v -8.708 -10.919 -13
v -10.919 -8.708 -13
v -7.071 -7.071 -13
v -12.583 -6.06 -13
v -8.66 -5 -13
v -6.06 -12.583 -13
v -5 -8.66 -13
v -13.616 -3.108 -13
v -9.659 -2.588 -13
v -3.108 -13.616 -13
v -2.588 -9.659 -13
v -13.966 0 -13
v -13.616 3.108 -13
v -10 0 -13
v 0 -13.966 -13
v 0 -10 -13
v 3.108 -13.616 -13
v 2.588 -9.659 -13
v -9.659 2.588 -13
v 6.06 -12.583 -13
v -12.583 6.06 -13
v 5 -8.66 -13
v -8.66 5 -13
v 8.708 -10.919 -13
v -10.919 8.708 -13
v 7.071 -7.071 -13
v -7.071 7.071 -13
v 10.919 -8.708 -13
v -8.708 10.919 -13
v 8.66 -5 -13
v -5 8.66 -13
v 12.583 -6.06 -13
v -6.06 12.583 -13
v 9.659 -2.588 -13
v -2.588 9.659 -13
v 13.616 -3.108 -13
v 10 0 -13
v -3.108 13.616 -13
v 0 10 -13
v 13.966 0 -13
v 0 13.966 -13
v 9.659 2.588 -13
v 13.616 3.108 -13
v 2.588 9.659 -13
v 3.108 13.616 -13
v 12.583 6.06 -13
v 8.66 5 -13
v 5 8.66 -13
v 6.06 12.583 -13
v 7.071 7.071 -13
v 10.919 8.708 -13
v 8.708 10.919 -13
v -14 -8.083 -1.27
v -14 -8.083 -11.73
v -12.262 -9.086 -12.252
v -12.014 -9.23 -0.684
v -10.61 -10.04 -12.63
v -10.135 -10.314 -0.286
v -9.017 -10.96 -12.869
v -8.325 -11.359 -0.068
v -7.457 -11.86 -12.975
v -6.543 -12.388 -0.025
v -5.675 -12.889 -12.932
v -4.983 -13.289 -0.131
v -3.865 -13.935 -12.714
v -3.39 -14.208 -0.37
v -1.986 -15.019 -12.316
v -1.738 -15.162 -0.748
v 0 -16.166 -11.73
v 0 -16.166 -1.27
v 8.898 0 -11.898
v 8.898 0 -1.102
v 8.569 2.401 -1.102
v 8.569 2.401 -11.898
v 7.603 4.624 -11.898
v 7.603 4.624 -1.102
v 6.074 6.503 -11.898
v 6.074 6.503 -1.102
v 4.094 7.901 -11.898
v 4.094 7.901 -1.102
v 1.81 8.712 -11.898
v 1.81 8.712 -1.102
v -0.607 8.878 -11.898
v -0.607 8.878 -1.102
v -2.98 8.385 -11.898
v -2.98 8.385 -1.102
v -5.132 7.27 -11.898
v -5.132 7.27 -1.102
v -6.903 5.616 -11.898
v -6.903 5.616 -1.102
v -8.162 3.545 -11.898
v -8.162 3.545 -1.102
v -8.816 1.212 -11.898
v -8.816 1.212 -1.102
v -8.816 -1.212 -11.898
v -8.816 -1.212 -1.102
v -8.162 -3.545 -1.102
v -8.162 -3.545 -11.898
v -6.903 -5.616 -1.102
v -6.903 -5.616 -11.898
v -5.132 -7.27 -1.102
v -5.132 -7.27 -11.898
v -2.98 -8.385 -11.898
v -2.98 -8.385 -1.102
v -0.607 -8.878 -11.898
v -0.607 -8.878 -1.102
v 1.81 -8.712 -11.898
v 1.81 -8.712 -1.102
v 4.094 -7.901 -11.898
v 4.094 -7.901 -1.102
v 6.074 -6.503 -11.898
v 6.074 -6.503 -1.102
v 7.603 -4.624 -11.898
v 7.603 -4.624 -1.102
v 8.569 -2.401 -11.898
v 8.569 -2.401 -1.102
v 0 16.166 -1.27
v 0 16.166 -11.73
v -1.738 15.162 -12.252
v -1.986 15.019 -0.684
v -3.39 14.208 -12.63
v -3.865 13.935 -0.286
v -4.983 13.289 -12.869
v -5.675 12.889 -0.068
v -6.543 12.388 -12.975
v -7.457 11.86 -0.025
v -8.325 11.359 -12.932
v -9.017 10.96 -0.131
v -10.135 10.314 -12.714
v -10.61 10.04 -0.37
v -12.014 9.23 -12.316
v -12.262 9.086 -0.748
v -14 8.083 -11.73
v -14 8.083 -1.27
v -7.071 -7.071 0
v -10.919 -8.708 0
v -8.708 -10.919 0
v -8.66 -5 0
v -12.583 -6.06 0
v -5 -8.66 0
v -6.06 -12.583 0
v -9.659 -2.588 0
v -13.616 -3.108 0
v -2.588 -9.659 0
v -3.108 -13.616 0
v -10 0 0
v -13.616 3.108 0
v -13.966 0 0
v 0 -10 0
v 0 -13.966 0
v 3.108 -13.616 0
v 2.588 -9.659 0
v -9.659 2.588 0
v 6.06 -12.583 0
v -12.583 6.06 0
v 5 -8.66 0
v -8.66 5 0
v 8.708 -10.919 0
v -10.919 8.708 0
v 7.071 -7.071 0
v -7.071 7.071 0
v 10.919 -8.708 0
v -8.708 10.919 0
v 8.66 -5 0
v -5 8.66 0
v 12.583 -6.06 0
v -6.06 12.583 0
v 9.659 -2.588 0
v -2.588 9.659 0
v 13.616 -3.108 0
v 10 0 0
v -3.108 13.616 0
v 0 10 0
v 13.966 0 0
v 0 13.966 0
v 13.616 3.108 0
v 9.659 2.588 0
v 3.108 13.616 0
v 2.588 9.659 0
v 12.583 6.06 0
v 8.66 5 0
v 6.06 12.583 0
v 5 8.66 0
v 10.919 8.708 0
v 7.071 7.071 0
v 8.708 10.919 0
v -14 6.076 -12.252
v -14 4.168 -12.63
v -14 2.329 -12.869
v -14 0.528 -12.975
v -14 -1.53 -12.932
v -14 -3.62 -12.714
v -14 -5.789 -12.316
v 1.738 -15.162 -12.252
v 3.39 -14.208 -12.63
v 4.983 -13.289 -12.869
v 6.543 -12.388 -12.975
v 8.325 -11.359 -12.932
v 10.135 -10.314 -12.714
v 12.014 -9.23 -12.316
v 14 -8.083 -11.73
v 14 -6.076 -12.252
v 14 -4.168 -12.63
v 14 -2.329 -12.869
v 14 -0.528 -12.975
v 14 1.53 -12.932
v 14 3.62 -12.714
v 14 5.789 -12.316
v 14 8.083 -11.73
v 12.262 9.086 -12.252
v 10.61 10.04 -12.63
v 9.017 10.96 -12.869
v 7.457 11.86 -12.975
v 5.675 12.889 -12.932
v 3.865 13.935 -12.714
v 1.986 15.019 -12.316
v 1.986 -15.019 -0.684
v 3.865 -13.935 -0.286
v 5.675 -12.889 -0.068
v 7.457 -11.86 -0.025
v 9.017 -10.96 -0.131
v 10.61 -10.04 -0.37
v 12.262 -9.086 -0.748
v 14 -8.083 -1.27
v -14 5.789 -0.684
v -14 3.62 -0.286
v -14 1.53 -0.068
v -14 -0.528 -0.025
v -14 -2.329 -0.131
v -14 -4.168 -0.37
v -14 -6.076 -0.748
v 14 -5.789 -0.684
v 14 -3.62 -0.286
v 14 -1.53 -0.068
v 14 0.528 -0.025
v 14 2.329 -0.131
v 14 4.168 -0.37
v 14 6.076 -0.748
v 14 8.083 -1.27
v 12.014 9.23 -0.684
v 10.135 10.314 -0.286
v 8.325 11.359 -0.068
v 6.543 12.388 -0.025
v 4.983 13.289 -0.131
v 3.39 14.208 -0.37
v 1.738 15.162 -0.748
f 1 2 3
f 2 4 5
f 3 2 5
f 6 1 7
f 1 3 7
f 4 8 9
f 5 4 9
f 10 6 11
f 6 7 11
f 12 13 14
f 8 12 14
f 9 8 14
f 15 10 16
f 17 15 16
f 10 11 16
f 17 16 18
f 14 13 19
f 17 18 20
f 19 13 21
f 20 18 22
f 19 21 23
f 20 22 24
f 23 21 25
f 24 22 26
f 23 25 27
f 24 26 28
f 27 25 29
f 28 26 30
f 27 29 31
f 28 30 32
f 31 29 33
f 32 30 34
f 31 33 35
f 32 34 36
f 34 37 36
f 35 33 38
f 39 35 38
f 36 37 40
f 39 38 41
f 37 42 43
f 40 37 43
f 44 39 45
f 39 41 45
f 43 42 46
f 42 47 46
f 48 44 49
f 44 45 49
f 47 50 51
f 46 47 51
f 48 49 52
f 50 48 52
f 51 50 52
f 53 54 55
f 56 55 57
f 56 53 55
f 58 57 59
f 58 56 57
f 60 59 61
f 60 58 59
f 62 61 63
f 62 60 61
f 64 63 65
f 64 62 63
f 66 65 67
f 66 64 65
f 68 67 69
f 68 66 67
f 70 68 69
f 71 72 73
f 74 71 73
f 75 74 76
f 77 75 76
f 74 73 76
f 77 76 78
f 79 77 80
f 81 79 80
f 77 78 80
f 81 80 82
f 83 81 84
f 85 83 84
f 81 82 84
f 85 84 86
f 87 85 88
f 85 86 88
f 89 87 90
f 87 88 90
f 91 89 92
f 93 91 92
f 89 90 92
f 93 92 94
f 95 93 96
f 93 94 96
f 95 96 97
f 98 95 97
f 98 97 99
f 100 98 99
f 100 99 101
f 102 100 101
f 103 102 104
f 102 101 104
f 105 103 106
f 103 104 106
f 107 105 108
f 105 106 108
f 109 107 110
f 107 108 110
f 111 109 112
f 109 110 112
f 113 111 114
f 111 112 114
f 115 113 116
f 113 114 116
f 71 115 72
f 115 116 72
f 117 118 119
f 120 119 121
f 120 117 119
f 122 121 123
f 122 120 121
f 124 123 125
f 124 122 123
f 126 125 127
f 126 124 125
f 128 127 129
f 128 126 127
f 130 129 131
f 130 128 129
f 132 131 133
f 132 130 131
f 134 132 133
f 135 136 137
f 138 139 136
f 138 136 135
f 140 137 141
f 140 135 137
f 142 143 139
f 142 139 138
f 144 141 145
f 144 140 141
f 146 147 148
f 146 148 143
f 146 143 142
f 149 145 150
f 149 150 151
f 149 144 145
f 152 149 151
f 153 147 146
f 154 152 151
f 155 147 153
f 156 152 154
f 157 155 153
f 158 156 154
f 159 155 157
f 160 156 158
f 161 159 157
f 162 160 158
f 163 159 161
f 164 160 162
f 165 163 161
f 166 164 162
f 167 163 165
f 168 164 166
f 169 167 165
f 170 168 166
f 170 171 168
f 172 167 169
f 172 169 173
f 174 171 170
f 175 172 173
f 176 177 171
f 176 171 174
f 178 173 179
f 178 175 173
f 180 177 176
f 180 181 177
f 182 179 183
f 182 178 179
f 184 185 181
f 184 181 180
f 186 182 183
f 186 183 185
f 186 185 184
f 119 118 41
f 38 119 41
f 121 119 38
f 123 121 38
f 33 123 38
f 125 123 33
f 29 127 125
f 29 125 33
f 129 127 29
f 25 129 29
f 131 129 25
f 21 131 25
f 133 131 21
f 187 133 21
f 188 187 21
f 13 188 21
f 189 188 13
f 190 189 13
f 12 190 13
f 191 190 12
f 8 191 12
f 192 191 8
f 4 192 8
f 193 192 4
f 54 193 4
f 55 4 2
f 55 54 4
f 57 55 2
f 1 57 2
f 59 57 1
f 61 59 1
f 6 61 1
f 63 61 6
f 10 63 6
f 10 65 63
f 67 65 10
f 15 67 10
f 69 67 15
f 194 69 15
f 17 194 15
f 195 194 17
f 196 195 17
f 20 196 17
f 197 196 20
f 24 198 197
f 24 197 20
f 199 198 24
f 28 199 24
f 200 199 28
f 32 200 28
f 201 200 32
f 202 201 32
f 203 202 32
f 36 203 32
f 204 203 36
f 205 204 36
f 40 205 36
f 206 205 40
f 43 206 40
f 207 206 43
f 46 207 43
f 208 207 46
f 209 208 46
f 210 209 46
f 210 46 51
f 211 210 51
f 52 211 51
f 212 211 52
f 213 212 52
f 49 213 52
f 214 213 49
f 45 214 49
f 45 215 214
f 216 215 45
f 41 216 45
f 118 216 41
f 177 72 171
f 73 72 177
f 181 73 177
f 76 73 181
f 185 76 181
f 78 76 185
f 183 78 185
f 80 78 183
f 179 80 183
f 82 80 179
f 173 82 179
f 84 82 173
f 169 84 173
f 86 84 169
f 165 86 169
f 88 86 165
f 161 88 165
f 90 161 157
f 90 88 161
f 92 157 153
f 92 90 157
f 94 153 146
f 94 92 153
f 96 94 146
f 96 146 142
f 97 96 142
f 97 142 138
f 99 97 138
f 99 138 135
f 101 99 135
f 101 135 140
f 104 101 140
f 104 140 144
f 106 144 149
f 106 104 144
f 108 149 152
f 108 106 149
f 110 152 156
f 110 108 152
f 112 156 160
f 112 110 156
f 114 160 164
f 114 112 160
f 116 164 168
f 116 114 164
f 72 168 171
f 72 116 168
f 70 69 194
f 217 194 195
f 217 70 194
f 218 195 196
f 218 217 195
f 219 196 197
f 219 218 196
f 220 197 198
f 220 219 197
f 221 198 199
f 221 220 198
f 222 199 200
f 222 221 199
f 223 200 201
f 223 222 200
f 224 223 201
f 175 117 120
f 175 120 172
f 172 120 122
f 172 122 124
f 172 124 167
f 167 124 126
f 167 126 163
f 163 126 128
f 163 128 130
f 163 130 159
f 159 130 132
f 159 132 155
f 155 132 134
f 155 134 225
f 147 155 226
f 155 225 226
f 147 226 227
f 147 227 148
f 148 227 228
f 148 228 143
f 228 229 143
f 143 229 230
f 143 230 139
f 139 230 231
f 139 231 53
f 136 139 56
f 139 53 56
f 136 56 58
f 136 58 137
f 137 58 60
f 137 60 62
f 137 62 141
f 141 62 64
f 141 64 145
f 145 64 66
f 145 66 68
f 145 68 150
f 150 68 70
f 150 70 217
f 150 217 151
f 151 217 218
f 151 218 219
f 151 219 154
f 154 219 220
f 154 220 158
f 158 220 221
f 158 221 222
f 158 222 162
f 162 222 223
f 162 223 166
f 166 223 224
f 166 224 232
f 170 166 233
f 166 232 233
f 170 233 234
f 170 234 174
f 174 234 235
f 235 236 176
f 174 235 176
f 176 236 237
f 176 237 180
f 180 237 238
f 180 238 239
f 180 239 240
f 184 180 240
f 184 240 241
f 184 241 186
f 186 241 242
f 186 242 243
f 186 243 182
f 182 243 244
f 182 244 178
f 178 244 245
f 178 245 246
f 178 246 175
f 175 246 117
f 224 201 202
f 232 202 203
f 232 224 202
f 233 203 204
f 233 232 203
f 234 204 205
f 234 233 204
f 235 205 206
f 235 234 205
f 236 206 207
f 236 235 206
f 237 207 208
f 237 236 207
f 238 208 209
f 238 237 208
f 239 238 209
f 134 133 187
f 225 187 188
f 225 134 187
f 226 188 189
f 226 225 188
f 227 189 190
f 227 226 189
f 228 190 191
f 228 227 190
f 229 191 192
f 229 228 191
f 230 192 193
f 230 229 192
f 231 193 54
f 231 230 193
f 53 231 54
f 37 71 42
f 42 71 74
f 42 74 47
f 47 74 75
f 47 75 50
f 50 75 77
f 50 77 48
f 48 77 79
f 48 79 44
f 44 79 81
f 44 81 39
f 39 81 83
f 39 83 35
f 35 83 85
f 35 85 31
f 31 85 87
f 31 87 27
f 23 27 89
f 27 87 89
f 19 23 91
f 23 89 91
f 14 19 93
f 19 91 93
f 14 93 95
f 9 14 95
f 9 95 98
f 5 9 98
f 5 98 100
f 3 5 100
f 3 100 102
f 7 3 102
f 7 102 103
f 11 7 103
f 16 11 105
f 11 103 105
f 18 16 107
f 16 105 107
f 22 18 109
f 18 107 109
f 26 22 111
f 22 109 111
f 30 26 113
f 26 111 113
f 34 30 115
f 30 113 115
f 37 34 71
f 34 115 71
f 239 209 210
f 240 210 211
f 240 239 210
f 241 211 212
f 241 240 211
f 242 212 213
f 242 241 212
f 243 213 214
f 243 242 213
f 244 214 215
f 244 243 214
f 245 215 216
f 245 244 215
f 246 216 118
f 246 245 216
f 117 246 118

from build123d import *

# Parameters (mm, degrees)
SKETCH_1_R      = 8.8985
EXTRUDE_1_DEPTH = 13
CHAMFER_1_SIZE  = 1.1015


with BuildPart() as part:
    # Эскиз1 → Бобышка-Вытянуть1 (new body)
    with BuildSketch(Plane.XY):
        Polygon((0, 16.165807537), (-14, 8.082903769), (-14, -8.082903769), (0, -16.165807537), (14, -8.082903769), (14, 8.082903769), align=None)
        Circle(SKETCH_1_R, mode=Mode.SUBTRACT)
    extrude(amount=-EXTRUDE_1_DEPTH)

    # Эскиз2 → Вырез-Повернуть1 (revolve, cut)
    with BuildSketch(Plane(origin=(0, 0, 0), x_dir=(0, 0, -1), z_dir=(1, 0, 0))):
        Polygon((0, 13.965807537), (5.773502692, 23.965807537), (0, 23.965807537), align=None)
        Polygon((13, 23.965807537), (13, 13.965807537), (7.226497308, 23.965807537), align=None)
    revolve(axis=Axis((0, 0, 0), (0, 0, 1)), mode=Mode.SUBTRACT)

    # Фаска1
    chamfer_1_edges = [part.edges().sort_by_distance(p)[0] for p in [
        (-8.8985, 0, -13),
        (-8.8985, 0, 0),
    ]]
    chamfer(chamfer_1_edges, length=CHAMFER_1_SIZE)


solid = part.part
